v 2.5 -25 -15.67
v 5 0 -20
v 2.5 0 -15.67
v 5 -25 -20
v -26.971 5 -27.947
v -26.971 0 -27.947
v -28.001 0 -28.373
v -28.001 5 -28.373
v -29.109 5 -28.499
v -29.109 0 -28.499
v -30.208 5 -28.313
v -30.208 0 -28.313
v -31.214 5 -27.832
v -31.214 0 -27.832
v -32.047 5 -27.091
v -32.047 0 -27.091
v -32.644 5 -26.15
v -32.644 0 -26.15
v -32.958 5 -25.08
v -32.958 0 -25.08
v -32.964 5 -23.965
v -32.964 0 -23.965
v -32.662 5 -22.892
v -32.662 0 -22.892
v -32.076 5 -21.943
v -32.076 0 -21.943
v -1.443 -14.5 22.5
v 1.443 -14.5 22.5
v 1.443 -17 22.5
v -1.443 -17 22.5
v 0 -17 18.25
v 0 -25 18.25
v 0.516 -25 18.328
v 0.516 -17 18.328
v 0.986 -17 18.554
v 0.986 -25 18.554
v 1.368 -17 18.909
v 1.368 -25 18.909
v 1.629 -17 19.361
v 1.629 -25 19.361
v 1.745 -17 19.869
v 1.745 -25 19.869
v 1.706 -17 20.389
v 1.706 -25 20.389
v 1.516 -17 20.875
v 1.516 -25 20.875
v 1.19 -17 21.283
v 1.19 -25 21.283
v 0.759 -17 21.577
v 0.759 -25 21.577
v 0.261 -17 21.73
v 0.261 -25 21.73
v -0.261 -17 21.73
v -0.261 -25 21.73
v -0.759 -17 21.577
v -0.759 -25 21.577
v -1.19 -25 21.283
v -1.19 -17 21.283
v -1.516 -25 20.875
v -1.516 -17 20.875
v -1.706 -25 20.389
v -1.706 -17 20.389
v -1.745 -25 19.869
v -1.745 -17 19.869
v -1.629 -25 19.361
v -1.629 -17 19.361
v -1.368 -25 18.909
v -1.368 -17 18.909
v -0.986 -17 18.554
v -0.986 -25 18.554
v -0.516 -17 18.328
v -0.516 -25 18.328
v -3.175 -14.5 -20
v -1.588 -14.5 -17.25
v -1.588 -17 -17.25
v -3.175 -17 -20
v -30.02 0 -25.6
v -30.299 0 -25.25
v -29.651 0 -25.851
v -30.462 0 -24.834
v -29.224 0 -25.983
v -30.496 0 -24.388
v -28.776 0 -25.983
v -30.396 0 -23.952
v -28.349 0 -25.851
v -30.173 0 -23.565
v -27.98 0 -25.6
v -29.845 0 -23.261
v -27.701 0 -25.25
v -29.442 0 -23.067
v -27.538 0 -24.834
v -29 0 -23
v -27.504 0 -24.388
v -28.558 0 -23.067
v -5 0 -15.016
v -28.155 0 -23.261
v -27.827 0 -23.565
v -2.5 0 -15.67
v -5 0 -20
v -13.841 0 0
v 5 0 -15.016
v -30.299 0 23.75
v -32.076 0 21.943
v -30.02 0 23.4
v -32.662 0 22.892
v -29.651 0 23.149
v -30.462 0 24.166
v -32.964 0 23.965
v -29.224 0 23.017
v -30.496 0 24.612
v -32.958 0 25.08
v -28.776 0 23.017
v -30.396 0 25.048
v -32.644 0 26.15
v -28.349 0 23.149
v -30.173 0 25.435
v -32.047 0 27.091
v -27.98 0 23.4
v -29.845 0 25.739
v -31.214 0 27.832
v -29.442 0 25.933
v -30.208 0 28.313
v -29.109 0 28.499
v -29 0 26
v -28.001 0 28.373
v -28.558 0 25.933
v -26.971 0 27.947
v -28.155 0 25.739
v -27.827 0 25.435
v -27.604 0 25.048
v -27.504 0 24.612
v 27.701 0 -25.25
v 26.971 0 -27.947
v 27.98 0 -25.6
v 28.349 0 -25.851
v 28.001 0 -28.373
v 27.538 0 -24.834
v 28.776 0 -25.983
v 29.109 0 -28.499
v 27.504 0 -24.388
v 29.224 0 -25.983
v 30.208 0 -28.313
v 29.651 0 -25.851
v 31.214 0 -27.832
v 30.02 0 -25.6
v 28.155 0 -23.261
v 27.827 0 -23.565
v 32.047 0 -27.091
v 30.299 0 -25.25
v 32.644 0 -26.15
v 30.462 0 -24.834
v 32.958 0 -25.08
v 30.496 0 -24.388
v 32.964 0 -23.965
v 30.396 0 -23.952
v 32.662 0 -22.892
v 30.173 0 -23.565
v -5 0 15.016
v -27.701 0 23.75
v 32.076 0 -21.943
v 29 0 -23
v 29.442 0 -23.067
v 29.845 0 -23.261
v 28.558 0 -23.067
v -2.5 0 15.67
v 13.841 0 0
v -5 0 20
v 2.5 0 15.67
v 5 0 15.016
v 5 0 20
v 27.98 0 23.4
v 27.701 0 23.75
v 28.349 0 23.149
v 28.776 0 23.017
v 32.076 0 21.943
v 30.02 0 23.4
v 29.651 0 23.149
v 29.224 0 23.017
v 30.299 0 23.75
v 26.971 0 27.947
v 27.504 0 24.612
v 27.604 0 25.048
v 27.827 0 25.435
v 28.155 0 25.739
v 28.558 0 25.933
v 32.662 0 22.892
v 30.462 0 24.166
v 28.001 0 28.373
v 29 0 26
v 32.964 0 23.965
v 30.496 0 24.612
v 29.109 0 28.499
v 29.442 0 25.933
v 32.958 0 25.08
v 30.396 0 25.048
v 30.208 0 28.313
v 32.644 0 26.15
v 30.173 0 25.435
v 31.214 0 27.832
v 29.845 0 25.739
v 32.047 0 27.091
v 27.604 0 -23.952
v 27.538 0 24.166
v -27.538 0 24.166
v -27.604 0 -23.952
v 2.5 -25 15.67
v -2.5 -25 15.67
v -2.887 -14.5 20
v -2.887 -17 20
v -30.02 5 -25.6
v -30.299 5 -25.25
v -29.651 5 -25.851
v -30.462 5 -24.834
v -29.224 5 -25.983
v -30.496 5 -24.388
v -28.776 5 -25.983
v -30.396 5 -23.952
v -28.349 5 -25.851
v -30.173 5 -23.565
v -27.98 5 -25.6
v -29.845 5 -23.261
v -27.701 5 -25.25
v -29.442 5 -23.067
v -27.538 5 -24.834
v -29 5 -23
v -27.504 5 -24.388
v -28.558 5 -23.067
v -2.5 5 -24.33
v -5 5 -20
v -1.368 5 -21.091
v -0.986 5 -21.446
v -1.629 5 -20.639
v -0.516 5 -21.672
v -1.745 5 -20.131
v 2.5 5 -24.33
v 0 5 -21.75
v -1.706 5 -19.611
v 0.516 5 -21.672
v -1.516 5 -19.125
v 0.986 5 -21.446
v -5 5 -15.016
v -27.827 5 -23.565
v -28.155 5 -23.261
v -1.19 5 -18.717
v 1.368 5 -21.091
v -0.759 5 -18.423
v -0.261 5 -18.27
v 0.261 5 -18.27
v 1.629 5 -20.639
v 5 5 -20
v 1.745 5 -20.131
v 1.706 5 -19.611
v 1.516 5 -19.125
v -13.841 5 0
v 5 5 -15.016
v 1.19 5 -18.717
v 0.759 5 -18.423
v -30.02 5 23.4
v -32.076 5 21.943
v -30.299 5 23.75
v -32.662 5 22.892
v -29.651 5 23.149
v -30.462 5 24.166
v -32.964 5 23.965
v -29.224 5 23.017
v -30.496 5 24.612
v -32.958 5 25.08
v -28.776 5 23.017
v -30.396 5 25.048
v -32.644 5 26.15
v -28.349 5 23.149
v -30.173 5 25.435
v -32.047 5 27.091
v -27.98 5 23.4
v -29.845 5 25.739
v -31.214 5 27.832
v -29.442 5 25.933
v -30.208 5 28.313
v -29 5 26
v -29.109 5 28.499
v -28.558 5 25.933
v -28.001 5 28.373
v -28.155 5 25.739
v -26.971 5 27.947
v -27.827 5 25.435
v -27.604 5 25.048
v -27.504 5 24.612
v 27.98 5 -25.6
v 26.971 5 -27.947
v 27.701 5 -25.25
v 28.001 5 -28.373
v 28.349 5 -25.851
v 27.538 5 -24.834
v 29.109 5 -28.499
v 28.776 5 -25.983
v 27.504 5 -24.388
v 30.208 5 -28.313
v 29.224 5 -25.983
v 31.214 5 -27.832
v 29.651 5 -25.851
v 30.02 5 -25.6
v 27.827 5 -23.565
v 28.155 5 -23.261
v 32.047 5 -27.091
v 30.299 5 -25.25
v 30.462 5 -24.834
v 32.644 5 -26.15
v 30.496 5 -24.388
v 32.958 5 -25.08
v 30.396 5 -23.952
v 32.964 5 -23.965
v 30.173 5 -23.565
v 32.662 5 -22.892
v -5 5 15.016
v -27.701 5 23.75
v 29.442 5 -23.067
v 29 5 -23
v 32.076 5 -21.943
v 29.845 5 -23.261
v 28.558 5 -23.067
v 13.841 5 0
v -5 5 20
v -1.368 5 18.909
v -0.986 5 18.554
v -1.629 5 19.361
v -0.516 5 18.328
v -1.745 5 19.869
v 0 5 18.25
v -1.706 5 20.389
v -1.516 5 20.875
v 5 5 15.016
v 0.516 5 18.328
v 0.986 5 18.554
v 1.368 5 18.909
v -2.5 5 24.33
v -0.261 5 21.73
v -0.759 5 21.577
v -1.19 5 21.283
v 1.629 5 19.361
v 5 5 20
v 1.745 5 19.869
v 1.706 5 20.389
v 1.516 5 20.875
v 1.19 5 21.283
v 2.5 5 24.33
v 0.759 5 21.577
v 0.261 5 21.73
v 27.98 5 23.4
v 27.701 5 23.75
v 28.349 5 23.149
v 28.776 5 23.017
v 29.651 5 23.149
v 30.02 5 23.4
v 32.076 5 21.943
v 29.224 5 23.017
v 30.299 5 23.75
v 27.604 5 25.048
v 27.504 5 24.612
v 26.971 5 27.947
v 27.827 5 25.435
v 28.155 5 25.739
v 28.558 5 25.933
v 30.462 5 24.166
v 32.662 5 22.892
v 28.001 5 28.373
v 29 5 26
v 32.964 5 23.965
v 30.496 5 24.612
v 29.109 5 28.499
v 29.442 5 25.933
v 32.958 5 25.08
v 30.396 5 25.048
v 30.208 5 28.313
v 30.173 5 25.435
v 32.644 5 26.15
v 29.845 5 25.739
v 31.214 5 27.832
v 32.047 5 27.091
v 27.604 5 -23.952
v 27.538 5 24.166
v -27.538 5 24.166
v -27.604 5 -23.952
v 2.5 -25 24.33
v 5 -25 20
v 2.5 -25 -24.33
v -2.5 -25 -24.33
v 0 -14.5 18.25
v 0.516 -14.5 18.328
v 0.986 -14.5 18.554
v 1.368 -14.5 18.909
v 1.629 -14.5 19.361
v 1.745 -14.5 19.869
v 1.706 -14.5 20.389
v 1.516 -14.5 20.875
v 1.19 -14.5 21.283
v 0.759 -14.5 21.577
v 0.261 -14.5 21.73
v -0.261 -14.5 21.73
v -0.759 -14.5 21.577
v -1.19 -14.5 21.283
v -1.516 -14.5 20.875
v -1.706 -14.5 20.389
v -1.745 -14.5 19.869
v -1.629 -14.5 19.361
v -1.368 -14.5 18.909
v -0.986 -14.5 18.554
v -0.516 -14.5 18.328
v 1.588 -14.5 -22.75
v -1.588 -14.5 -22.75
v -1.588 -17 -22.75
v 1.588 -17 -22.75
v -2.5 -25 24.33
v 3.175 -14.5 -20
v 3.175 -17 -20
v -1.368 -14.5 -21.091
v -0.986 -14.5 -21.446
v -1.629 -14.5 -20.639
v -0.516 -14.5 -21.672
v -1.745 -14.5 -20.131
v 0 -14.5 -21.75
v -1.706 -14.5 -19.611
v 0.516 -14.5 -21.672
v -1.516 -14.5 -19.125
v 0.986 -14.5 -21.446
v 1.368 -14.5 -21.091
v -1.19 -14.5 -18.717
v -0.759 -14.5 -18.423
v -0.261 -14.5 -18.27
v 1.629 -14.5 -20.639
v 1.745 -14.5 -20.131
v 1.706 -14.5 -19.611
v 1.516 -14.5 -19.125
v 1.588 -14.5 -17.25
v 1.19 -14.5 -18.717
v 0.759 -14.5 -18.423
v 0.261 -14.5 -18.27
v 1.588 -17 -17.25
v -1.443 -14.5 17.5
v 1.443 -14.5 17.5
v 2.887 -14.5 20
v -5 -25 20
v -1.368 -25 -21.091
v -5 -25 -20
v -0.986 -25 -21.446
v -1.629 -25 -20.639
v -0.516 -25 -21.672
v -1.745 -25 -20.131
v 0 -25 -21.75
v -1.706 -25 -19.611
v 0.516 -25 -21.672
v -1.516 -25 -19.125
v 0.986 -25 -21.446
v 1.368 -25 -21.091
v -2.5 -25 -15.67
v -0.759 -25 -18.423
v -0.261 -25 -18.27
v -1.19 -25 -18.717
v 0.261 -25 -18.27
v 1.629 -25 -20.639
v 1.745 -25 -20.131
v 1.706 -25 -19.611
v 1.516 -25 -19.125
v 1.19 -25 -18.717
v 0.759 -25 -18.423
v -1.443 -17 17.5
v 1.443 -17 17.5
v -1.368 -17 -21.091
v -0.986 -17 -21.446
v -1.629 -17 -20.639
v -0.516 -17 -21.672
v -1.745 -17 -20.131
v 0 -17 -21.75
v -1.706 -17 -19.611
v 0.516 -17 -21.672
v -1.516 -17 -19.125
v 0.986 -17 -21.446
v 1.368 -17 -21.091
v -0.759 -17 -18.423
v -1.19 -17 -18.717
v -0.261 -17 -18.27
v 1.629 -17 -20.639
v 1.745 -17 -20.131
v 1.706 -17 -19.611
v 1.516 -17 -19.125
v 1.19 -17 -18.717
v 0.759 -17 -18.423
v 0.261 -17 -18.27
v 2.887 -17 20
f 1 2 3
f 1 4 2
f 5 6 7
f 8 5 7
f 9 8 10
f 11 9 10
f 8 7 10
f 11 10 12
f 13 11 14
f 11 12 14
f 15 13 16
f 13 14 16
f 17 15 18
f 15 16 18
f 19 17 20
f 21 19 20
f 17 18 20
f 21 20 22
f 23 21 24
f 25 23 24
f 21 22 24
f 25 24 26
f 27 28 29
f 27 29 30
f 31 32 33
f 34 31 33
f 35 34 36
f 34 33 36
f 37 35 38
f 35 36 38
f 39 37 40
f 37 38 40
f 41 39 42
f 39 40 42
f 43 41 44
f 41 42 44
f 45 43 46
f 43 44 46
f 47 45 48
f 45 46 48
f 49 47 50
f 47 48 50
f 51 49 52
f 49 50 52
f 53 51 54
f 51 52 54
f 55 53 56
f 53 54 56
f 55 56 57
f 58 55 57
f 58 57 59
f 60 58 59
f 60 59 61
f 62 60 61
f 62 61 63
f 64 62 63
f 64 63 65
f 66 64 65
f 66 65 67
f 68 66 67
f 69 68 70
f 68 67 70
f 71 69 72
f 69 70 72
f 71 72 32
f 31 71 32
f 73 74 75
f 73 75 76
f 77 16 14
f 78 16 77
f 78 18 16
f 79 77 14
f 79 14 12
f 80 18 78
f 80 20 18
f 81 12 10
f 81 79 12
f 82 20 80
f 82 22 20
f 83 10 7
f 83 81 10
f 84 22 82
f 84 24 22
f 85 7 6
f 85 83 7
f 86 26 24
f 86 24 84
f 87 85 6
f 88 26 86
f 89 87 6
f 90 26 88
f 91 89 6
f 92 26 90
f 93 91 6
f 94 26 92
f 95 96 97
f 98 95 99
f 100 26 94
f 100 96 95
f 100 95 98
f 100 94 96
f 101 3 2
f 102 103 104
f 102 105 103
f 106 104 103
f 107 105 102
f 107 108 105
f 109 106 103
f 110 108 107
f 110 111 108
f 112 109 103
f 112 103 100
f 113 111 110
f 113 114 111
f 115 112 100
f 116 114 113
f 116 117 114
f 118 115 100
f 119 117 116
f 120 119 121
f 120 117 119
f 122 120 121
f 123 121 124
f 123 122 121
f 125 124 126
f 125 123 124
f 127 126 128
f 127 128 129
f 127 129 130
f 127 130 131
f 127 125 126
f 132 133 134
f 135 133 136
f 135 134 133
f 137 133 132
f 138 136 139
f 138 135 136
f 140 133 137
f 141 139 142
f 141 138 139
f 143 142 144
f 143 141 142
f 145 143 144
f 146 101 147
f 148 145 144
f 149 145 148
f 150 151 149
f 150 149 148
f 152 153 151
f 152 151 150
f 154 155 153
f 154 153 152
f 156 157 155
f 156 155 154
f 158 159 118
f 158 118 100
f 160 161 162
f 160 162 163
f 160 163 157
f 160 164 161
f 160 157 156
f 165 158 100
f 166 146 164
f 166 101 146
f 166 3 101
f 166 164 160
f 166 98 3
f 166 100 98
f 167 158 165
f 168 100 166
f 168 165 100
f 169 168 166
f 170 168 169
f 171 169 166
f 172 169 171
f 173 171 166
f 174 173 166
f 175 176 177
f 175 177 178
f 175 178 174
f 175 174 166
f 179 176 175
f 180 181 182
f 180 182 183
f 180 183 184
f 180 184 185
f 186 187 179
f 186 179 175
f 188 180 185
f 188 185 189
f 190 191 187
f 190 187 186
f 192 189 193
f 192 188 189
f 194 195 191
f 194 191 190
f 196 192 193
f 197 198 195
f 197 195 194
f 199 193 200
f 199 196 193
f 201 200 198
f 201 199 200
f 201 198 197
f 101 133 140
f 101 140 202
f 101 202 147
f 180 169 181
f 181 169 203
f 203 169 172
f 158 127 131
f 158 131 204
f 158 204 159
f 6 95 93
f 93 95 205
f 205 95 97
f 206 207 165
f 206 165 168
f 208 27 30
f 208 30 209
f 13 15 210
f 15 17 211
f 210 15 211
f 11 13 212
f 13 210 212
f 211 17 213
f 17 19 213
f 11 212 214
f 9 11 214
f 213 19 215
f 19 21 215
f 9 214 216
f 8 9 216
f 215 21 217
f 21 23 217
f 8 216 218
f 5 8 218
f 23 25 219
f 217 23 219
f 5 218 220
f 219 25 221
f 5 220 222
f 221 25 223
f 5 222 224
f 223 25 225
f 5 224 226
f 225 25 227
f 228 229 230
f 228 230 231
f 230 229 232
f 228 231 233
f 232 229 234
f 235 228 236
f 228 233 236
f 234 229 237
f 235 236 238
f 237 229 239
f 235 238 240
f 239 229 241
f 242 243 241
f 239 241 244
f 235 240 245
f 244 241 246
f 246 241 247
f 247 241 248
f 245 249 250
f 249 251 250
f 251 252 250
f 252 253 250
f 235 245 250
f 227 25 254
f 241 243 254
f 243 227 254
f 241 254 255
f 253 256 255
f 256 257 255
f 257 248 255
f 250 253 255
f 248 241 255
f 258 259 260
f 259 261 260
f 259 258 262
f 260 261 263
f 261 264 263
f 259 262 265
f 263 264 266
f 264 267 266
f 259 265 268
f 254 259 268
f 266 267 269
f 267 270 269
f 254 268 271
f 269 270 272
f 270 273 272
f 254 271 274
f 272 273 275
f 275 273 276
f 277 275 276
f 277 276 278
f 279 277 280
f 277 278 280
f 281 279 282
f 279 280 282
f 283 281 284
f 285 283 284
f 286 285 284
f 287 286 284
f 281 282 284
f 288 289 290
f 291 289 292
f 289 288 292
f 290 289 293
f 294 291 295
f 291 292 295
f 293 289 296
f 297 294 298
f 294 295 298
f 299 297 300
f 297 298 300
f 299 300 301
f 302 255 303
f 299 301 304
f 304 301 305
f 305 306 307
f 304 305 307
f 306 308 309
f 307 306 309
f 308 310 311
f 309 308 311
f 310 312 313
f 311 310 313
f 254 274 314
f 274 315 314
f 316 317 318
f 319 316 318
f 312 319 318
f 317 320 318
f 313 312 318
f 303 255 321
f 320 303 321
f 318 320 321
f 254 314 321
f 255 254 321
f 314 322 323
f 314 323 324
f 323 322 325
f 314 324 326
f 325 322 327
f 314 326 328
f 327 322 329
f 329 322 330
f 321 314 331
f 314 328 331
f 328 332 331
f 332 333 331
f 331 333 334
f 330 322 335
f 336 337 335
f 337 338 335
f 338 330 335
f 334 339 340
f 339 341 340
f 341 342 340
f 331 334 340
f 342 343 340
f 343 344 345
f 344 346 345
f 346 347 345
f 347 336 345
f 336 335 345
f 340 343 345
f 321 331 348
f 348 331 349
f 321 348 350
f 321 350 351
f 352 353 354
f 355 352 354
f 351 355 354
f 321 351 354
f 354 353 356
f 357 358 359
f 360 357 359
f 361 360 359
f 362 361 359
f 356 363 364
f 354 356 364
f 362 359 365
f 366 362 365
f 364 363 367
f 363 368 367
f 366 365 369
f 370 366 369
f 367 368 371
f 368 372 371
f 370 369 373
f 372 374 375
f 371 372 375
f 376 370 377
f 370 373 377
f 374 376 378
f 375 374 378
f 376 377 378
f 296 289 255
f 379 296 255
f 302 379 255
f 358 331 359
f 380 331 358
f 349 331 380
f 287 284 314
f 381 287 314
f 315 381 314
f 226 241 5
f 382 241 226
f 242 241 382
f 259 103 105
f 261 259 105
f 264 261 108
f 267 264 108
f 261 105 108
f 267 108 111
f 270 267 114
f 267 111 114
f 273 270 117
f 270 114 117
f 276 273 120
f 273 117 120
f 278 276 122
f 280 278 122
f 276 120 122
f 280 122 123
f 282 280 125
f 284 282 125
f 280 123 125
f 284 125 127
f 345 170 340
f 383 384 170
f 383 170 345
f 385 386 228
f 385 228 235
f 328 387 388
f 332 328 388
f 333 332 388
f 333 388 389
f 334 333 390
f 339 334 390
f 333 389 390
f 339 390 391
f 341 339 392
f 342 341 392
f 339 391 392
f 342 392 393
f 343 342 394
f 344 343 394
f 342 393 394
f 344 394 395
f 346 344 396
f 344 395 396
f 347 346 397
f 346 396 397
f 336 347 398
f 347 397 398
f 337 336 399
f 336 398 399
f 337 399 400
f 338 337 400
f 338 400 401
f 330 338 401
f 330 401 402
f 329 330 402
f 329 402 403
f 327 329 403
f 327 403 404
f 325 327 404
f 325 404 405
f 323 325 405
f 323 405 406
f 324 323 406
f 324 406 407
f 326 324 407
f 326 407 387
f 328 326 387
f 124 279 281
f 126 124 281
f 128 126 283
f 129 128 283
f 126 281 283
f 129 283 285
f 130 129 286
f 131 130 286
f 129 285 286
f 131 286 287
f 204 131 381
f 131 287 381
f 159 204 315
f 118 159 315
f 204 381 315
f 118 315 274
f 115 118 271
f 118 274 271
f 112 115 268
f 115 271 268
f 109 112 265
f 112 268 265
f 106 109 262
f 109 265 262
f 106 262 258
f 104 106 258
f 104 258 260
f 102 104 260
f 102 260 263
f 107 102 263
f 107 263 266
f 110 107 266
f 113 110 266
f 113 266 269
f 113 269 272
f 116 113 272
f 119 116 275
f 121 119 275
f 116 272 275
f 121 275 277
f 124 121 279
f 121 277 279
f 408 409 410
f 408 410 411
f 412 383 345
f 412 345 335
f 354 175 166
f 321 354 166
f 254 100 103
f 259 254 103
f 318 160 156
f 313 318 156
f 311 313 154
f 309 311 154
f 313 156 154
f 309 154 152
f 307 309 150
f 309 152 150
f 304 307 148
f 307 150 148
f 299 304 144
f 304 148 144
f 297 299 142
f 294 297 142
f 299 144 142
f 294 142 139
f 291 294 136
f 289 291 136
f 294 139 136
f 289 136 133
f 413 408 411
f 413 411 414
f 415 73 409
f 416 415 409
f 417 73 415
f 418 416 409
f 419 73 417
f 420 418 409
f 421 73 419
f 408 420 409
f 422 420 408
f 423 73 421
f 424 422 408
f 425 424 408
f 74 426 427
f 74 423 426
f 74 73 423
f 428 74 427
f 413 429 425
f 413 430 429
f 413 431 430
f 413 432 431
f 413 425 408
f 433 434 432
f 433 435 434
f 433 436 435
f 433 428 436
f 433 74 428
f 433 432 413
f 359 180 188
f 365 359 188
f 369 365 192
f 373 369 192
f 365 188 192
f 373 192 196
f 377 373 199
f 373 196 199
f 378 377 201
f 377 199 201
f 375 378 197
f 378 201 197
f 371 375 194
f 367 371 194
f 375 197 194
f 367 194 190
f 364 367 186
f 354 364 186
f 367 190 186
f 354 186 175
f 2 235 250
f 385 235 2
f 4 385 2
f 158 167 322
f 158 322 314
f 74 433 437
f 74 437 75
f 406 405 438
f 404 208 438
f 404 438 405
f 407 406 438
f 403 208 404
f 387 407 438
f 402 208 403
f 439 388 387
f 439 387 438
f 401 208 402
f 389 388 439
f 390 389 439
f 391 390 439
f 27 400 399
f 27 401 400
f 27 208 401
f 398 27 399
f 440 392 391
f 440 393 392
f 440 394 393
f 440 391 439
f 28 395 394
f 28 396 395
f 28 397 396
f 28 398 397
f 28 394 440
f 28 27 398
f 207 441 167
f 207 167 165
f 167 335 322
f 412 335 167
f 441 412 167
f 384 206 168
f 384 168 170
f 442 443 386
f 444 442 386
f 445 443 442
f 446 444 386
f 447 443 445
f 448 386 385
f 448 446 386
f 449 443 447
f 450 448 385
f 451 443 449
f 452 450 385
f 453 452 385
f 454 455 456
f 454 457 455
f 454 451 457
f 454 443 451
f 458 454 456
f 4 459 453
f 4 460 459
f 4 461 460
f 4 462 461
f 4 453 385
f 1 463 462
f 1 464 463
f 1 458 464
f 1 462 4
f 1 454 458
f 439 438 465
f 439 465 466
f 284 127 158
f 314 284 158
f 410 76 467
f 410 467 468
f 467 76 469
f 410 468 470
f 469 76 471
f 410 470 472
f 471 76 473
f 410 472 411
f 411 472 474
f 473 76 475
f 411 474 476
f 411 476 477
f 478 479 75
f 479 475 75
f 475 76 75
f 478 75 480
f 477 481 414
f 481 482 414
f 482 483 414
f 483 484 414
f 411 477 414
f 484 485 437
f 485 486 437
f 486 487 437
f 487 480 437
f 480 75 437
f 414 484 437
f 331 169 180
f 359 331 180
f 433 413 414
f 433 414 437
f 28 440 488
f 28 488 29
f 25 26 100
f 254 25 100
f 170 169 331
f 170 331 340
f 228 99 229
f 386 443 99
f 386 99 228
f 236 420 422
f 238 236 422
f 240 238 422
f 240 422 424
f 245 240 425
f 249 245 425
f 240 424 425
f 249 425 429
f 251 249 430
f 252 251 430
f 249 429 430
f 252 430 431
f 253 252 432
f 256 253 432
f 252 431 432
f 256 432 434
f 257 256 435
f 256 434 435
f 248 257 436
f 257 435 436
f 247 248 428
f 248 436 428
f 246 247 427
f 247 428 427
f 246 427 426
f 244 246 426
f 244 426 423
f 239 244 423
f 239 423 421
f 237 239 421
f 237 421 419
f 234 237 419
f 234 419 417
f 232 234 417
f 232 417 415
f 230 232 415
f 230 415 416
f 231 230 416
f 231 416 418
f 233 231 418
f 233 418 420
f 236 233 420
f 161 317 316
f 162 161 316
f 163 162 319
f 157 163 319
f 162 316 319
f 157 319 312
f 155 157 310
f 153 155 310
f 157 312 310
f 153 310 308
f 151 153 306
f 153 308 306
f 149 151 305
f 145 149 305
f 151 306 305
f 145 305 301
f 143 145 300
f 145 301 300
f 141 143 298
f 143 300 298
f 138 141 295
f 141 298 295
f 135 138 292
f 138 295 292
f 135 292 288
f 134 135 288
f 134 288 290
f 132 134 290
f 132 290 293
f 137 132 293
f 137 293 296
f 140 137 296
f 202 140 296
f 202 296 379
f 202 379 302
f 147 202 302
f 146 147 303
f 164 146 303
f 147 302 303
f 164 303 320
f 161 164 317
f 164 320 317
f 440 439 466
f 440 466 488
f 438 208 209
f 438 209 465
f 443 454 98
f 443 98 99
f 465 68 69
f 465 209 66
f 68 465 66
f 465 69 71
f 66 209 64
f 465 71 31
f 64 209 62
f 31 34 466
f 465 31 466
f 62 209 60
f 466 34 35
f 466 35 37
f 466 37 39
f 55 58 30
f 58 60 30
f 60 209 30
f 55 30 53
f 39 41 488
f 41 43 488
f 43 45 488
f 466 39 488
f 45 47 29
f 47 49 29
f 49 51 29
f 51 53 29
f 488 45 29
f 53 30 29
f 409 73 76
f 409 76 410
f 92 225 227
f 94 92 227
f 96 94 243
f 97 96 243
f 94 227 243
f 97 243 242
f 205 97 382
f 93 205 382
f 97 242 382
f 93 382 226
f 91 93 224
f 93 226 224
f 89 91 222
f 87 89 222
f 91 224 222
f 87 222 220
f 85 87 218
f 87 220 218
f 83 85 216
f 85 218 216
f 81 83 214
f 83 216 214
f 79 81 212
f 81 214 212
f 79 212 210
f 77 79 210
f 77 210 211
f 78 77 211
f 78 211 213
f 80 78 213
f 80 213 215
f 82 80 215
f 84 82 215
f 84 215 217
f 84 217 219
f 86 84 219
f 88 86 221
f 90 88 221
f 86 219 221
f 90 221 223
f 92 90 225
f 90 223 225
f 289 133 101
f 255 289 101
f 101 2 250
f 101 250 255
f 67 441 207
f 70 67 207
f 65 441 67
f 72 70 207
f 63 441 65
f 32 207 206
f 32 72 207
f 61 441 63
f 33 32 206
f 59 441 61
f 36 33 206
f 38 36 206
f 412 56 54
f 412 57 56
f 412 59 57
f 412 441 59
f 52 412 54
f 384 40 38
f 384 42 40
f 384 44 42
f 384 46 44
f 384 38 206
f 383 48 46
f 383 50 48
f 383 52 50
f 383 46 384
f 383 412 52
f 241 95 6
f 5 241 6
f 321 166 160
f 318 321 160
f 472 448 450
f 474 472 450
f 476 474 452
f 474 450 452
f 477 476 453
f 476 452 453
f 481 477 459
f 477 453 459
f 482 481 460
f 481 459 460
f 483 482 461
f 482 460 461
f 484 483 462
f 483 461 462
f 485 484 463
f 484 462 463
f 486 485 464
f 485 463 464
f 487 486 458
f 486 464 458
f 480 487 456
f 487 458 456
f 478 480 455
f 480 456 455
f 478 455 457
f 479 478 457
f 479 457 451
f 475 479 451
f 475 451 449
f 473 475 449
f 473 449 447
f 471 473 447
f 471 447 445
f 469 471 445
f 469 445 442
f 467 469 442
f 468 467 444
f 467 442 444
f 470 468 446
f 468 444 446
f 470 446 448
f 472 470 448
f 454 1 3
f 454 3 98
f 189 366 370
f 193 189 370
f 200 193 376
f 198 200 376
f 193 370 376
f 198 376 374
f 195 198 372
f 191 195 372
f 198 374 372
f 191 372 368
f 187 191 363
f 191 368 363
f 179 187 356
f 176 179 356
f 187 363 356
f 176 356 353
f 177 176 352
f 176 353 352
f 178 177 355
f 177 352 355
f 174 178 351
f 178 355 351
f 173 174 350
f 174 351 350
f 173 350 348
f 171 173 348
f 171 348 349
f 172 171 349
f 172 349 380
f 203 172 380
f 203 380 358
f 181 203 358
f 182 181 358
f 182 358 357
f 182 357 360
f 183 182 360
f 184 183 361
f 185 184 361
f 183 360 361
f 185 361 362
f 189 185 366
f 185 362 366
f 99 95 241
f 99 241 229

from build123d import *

# Parameters (mm, degrees)
BOSS_EXTRU_1_DEPTH      = 5
ESQUISSE2_R             = 1.5
ENL_V_MAT_EXTRU_2_DEPTH = 5
ESQUISSE4_R             = 1.75
BOSS_EXTRU_6_DEPTH      = 5
BOSS_EXTRU_7_START      = 14.5
ESQUISSE4_3_R           = 1.75
BOSS_EXTRU_7_DEPTH      = 14.5
BOSS_EXTRU_8_DEPTH      = 2.5
BOSS_EXTRU_10_START     = 25
ESQUISSE4_6_R           = 1.75
BOSS_EXTRU_10_DEPTH     = 8


with BuildPart() as part:
    # Esquisse1 → Boss.-Extru.1 (new body)
    with BuildSketch(Plane(origin=(0, 0, 0), x_dir=(1, 0, 0), z_dir=(0, 1, 0))):
        with BuildLine():
            ThreePointArc((-26.971076335, 27.947240746), (-32.047229987, 27.091213887), (-32.076386522, 21.943469936))
            Line((-32.076386522, 21.943469936), (-13.840985932, 0))
            Line((-13.840985932, 0), (-32.076386522, -21.943469936))
            ThreePointArc((-32.076386522, -21.943469936), (-32.047229987, -27.091213887), (-26.971076335, -27.947240746))
            Line((-26.971076335, -27.947240746), (0, -12.073021601))
            Line((0, -12.073021601), (26.971076335, -27.947240746))
            ThreePointArc((26.971076335, -27.947240746), (32.047229987, -27.091213887), (32.076386522, -21.943469936))
            Line((32.076386522, -21.943469936), (13.840985932, 0))
            Line((13.840985932, 0), (32.076386522, 21.943469936))
            ThreePointArc((32.076386522, 21.943469936), (32.047229987, 27.091213887), (26.971076335, 27.947240746))
            Line((26.971076335, 27.947240746), (0, 12.073021601))
            Line((0, 12.073021601), (-26.971076335, 27.947240746))
        make_face()
    extrude(amount=BOSS_EXTRU_1_DEPTH)

    # Esquisse2 → Enlèv. mat.-Extru.2 (cut)
    with BuildSketch(Plane(origin=(0, 5, 0), x_dir=(1, 0, 0), z_dir=(0, 1, 0))):
        with Locations((-29, 24.5)):
            Circle(ESQUISSE2_R)
        with Locations((29, 24.5)):
            Circle(ESQUISSE2_R)
        with Locations((29, -24.5)):
            Circle(ESQUISSE2_R)
        with Locations((-29, -24.5)):
            Circle(ESQUISSE2_R)
    extrude(amount=-ENL_V_MAT_EXTRU_2_DEPTH, mode=Mode.SUBTRACT)

    # Esquisse4 → Boss.-Extru.6 (add)
    # profile 1 of 2: a face of its own
    with BuildSketch(Plane.XZ):
        Polygon((5, 15.015844303), (5, 20), (2.5, 24.330127019), (-2.5, 24.330127019), (-5, 20), (-5, 15.015844303), (0, 12.073021601), align=None)
        with Locations((0, 20)):
            Circle(ESQUISSE4_R, mode=Mode.SUBTRACT)
    # profile 2 of 2: a face of its own
    with BuildSketch(Plane.XZ):
        Polygon((2.5, -24.330127019), (5, -20), (5, -15.015844303), (0, -12.073021601), (-5, -15.015844303), (-5, -20), (-2.5, -24.330127019), align=None)
        with Locations((0, -20)):
            Circle(ESQUISSE4_R, mode=Mode.SUBTRACT)
    extrude(amount=-BOSS_EXTRU_6_DEPTH)

    # Esquisse4<3> → Boss.-Extru.7 (add)
    # profile 1 of 2: a face of its own
    with BuildSketch(Plane.XZ.offset(BOSS_EXTRU_7_START)):
        Polygon((-2.5, 24.330127019), (-5, 20), (-2.5, 15.669872981), (2.5, 15.669872981), (5, 20), (2.5, 24.330127019), align=None)
        with Locations((0, 20)):
            Circle(ESQUISSE4_3_R, mode=Mode.SUBTRACT)
    # profile 2 of 2: a face of its own
    with BuildSketch(Plane.XZ.offset(BOSS_EXTRU_7_START)):
        Polygon((2.5, -24.330127019), (5, -20), (2.5, -15.669872981), (-2.5, -15.669872981), (-5, -20), (-2.5, -24.330127019), align=None)
        with Locations((0, -20)):
            Circle(ESQUISSE4_3_R, mode=Mode.SUBTRACT)
    extrude(amount=-BOSS_EXTRU_7_DEPTH)

    # Esquisse5 → Boss.-Extru.8 (add)
    # profile 1 of 2: a face of its own
    with BuildSketch(Plane.XZ.offset(14.5)):
        Polygon((5, 20), (2.5, 24.330127019), (-2.5, 24.330127019), (-5, 20), (-2.5, 15.669872981), (2.5, 15.669872981), align=None)
        Polygon((2.886751346, 20), (1.443375673, 22.5), (-1.443375673, 22.5), (-2.886751346, 20), (-1.443375673, 17.5), (1.443375673, 17.5), align=None, mode=Mode.SUBTRACT)
    # profile 2 of 2: a face of its own
    with BuildSketch(Plane.XZ.offset(14.5)):
        Polygon((5, -20), (2.5, -15.669872981), (-2.5, -15.669872981), (-5, -20), (-2.5, -24.330127019), (2.5, -24.330127019), align=None)
        Polygon((3.175426481, -20), (1.58771324, -17.25), (-1.58771324, -17.25), (-3.175426481, -20), (-1.58771324, -22.75), (1.58771324, -22.75), align=None, mode=Mode.SUBTRACT)
    extrude(amount=BOSS_EXTRU_8_DEPTH)

    # Esquisse4<6> → Boss.-Extru.10 (add)
    # profile 1 of 2: a face of its own
    with BuildSketch(Plane.XZ.offset(BOSS_EXTRU_10_START)):
        Polygon((-2.5, 24.330127019), (-5, 20), (-2.5, 15.669872981), (2.5, 15.669872981), (5, 20), (2.5, 24.330127019), align=None)
        with Locations((0, 20)):
            Circle(ESQUISSE4_6_R, mode=Mode.SUBTRACT)
    # profile 2 of 2: a face of its own
    with BuildSketch(Plane.XZ.offset(BOSS_EXTRU_10_START)):
        Polygon((2.5, -24.330127019), (5, -20), (2.5, -15.669872981), (-2.5, -15.669872981), (-5, -20), (-2.5, -24.330127019), align=None)
        with Locations((0, -20)):
            Circle(ESQUISSE4_6_R, mode=Mode.SUBTRACT)
    extrude(amount=-BOSS_EXTRU_10_DEPTH)


solid = part.part
